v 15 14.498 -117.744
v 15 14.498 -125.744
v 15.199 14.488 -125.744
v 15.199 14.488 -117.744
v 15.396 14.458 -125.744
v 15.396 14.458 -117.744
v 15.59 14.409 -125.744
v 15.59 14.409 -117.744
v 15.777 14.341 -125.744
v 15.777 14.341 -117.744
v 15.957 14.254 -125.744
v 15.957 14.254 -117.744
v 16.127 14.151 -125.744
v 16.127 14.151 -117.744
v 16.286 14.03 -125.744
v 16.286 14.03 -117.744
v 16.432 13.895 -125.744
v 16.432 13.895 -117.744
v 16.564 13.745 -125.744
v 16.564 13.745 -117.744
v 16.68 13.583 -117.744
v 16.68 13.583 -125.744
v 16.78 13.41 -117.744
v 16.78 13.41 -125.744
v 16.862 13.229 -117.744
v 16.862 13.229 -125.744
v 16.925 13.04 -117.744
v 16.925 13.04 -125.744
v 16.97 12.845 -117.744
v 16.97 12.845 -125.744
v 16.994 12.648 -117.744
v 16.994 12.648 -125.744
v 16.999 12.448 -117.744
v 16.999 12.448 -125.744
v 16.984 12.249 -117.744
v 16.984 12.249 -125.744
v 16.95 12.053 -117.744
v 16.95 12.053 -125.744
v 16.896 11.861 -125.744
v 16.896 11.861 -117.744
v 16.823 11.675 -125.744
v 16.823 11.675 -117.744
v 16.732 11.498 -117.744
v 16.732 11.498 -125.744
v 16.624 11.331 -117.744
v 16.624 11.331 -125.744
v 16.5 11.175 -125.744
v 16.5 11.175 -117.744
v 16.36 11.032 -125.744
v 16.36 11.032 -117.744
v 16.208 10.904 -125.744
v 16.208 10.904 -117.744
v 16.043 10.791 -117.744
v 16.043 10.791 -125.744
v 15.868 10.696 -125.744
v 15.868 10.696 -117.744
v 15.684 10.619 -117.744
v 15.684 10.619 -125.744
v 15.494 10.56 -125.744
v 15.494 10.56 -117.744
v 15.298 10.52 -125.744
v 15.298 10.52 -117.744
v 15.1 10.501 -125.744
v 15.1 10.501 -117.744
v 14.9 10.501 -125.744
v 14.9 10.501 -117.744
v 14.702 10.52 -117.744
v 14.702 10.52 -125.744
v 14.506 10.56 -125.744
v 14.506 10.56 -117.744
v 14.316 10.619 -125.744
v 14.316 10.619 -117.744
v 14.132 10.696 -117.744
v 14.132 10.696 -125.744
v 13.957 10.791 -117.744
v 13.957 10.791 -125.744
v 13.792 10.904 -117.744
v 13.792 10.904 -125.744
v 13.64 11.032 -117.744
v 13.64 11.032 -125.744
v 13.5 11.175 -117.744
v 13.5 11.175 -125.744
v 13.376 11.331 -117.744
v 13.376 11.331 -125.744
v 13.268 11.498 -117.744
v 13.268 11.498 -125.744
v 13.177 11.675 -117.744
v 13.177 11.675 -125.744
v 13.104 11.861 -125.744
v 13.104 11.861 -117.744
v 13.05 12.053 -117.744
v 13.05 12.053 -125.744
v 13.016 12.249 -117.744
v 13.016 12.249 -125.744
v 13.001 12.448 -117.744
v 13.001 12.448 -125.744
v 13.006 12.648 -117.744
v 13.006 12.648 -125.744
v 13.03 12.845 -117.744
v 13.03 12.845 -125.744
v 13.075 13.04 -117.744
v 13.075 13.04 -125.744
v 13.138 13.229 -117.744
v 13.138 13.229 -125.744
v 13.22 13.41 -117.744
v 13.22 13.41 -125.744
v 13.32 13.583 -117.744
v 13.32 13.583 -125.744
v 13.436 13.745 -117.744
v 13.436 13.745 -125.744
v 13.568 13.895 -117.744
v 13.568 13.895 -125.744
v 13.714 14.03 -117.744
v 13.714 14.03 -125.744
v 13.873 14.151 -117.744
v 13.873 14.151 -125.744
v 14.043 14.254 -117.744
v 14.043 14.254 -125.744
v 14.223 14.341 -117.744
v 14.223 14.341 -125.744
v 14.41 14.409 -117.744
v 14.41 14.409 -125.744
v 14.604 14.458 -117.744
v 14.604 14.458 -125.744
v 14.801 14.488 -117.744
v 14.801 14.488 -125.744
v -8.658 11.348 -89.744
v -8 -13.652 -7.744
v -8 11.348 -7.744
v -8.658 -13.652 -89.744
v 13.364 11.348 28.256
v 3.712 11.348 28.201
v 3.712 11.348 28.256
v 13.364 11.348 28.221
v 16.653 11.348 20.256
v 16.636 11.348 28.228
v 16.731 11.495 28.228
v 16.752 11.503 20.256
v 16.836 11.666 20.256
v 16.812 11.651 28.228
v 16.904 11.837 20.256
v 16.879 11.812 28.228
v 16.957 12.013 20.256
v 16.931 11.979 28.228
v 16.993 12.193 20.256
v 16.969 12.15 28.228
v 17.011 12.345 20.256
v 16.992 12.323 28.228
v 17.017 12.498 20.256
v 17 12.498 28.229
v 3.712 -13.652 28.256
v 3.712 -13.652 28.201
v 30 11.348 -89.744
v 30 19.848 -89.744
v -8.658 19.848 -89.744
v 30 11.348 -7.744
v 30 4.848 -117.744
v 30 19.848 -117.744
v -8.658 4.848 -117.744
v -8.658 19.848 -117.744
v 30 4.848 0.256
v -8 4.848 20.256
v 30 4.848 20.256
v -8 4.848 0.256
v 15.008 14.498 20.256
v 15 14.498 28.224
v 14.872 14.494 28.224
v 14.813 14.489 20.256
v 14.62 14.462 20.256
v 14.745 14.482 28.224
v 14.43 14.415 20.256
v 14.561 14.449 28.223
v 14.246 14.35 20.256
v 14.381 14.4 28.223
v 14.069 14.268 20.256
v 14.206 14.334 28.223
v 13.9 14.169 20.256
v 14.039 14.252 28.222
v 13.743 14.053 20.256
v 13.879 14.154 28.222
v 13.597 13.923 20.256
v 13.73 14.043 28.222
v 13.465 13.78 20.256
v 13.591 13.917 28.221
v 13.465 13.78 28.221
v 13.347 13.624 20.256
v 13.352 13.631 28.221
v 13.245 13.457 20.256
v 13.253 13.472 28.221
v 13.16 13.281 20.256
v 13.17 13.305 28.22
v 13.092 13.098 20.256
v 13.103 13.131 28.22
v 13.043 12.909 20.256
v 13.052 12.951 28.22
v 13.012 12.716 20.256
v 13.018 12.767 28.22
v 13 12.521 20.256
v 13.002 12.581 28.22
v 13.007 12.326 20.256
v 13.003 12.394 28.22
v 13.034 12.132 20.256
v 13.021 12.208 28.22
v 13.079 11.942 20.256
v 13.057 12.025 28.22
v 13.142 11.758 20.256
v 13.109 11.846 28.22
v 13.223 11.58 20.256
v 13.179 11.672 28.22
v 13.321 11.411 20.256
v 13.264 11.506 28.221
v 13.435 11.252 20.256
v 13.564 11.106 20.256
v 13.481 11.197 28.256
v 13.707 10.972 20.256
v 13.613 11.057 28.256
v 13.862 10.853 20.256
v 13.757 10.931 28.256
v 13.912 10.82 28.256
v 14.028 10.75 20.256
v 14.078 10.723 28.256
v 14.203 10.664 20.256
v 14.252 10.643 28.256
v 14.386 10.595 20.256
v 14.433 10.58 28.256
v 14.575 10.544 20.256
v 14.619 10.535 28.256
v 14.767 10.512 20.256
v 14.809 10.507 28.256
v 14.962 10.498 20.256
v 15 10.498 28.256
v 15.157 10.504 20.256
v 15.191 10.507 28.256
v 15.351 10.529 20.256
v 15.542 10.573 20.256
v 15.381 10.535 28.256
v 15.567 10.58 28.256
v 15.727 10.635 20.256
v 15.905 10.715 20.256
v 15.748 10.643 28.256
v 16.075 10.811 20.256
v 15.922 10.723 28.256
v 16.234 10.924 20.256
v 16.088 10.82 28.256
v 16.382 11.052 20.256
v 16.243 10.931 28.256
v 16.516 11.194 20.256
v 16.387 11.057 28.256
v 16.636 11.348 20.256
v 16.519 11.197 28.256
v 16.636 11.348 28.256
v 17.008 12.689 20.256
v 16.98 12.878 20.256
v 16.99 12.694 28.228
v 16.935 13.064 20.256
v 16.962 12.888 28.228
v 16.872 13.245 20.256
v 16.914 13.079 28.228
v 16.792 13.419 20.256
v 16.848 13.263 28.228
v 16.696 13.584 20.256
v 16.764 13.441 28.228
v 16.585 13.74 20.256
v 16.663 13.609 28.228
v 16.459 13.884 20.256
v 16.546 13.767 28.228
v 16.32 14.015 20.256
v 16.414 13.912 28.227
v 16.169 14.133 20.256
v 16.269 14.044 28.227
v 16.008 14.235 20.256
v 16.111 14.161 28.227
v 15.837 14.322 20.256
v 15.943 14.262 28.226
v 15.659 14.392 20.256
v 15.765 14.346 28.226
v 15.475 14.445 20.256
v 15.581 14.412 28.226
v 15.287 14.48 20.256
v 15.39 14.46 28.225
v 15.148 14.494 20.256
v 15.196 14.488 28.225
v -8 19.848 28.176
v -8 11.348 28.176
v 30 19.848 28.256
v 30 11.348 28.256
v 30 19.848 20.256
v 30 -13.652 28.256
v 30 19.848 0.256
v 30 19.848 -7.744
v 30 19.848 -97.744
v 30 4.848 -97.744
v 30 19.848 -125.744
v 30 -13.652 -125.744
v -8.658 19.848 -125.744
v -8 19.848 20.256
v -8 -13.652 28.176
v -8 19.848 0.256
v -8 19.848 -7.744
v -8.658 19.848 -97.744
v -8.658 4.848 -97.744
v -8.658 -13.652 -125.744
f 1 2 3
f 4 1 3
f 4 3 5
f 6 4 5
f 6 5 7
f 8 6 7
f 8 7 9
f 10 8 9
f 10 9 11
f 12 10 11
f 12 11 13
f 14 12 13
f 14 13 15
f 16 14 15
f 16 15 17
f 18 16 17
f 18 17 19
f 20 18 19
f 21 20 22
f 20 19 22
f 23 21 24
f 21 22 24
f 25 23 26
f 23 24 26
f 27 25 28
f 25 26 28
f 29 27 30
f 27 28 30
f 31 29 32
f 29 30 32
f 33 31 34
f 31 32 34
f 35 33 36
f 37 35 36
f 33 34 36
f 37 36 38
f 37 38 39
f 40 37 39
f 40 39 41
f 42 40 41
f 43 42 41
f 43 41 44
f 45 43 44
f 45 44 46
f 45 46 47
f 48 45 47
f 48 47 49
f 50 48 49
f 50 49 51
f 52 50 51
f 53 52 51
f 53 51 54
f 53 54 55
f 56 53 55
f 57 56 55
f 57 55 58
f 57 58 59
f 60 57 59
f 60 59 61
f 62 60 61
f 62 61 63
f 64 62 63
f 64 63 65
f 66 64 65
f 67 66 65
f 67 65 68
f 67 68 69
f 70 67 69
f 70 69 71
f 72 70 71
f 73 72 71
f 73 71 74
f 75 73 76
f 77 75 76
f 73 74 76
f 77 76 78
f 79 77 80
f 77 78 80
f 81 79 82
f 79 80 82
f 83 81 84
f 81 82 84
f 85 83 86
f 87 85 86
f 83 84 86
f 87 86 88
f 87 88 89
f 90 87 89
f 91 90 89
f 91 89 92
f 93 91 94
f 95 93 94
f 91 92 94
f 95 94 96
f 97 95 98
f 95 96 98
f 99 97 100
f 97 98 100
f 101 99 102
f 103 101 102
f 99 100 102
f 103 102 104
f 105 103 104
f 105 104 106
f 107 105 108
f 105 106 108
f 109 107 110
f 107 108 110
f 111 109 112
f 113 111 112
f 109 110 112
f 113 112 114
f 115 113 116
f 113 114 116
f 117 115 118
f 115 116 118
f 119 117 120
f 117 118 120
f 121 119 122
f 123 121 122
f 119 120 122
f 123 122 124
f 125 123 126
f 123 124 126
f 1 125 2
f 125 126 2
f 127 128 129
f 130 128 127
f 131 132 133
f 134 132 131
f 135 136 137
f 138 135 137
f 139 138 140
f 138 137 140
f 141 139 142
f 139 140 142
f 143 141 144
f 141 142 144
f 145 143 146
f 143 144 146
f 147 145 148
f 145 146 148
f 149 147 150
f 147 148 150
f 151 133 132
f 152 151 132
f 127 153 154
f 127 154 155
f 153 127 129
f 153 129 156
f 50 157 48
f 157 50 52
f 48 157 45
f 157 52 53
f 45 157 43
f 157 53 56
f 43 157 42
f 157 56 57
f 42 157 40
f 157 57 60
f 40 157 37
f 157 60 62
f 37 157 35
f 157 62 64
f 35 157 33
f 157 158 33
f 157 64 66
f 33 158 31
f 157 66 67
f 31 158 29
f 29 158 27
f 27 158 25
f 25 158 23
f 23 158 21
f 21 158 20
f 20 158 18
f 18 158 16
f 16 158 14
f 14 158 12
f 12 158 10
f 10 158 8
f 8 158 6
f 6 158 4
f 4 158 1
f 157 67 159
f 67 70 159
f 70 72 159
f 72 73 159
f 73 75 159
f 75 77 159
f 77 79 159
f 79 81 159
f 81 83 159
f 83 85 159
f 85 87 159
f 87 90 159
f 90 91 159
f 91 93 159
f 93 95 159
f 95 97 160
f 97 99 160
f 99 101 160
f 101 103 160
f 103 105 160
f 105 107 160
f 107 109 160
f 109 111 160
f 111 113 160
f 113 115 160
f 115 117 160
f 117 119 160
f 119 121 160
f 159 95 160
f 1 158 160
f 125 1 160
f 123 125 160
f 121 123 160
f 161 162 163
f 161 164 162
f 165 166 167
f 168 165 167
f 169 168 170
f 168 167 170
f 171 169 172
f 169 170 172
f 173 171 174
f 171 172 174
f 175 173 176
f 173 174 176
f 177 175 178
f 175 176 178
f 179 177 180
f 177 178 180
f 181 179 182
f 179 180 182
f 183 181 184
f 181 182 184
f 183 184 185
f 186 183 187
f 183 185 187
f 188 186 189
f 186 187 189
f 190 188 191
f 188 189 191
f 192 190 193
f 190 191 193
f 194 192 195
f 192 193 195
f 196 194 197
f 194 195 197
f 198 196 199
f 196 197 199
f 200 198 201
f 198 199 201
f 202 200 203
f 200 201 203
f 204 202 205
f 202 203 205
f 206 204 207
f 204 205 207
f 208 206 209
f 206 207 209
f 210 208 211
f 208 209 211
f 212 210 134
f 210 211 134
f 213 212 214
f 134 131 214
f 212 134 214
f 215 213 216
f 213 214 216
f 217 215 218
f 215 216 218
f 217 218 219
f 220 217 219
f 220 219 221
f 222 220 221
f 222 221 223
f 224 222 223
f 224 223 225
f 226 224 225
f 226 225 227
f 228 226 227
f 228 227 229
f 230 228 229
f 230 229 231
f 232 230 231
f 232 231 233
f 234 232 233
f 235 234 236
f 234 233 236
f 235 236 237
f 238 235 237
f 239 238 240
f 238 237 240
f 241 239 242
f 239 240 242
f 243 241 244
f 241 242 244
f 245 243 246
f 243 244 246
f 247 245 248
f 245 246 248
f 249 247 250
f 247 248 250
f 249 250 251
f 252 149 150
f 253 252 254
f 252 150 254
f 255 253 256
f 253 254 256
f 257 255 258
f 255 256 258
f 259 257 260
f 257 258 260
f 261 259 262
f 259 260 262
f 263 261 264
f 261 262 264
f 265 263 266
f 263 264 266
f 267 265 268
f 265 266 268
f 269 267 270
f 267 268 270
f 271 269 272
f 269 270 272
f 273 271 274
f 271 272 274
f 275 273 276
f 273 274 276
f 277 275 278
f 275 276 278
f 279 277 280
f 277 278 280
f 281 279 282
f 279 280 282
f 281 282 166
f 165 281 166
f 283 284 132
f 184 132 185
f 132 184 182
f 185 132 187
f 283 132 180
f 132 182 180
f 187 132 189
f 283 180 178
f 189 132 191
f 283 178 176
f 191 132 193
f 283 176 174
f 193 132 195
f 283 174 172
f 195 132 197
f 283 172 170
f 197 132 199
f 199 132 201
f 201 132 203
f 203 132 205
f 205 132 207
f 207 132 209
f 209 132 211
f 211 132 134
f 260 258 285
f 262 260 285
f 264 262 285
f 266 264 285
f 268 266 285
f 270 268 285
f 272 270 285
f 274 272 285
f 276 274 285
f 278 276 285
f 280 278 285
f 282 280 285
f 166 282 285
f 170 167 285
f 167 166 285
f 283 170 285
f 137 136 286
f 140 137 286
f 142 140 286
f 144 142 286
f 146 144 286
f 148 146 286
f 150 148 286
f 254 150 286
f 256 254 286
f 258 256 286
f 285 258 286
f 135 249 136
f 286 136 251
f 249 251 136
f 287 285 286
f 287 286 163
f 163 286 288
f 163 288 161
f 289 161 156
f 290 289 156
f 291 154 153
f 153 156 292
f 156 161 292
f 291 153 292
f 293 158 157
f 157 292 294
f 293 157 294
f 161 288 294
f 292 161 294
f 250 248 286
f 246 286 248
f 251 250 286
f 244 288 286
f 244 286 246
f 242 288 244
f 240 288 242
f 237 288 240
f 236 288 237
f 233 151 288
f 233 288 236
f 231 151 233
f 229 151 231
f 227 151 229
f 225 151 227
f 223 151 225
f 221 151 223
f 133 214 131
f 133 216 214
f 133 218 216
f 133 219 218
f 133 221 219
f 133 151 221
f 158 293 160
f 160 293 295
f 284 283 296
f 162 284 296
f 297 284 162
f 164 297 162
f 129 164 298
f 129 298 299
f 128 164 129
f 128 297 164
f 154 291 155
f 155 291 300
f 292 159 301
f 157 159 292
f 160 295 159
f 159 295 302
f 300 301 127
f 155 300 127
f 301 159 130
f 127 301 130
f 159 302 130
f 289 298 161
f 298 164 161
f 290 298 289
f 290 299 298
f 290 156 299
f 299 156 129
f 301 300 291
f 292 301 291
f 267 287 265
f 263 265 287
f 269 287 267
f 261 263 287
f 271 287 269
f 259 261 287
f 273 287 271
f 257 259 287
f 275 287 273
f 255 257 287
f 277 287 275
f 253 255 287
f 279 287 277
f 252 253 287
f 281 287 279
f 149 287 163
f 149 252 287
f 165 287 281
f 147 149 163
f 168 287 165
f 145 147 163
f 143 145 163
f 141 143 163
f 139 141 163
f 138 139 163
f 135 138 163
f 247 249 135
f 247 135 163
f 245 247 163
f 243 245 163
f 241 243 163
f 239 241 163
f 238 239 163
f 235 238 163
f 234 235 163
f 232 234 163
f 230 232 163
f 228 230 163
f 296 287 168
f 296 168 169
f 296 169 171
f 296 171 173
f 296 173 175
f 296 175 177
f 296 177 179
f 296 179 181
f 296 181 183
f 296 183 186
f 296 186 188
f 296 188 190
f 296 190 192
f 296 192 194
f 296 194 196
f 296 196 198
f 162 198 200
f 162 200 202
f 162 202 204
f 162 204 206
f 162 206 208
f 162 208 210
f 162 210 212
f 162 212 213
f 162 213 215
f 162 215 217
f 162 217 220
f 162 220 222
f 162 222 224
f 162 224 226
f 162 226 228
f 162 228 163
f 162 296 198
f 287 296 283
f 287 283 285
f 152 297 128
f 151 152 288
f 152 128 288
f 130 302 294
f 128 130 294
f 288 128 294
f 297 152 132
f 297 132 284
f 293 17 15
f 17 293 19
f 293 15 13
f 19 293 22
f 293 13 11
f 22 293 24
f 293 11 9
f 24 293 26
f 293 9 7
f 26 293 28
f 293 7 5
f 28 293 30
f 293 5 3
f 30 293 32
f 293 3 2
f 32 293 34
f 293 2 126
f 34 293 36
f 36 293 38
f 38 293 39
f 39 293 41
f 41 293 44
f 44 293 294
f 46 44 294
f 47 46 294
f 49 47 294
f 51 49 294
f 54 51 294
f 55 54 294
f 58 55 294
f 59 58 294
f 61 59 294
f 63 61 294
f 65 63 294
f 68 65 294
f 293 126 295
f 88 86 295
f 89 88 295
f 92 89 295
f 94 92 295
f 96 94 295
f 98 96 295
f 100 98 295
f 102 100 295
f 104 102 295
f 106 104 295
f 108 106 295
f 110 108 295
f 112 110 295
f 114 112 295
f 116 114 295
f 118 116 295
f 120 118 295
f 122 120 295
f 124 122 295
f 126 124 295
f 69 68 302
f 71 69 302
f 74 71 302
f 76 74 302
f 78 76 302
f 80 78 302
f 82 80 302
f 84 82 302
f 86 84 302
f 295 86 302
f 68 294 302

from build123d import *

# Parameters (mm, degrees)
EXTRUDE_1_DEPTH           = 30
SKETCH_2_W                = 20
SKETCH_2_H                = 15
SKETCH_2_W_2              = 70
SKETCH_2_H_2              = 10
EXTRUDE_4_DEPTH           = 70
SKETCH_5_R                = 2.8
CUT_EXTRUDE_3_DEPTH       = 5
SKETCH_6_R                = 2.8
CUT_EXTRUDE_4_DEPTH       = 5
PATTERN_LINEAR_1_COUNT    = 3
PATTERN_LINEAR_1_PITCH    = 19
SKETCH_14_W               = 30
SKETCH_14_H               = 20
EXTRUDE_16_DEPTH          = 8.5
EXTRUDE_17_DEPTH          = 8.5
EXTRUDE_18_DEPTH          = 8.5
SKETCH_15_W               = 140
SKETCH_15_H               = 160
EXTRUDE_21_DEPTH          = 10
SKETCH_17_W               = 140
SKETCH_17_H               = 160
EXTRUDE_22_DEPTH          = 15
CUT_EXTRUDE_8_REACH       = 328.336
SKETCH_20_R               = 2
CUT_EXTRUDE_10_REACH      = 267.273
CUT_EXTRUDE_11_REACH      = 267.358
SKETCH_22_R               = 2
SKETCH_23_R               = 2.8
CUT_EXTRUDE_12_DEPTH      = 5
SKETCH_24_R               = 1.9
CUT_EXTRUDE_13_DEPTH      = 5
CUT_EXTRUDE_16_DEPTH      = 251.685617404
CUT_EXTRUDE_16_DEPTH_BACK = 251.685617404
CUT_EXTRUDE_17_DEPTH      = 15


with BuildPart() as part:
    # 草图1 → 凸台-拉伸1 (new body)
    with BuildSketch(Plane(origin=(0, 0, 0), x_dir=(0, 0, -1), z_dir=(1, 0, 0))):
        Polygon((-20.255776875, 11.348042253), (-20.255776875, -3.651957747), (-0.255776875, -3.651957747), (-0.255776875, 11.348042253), (97.744223125, 11.348042253), (97.744223125, -3.651957747), (117.744223125, -3.651957747), (117.744223125, 11.348042253), (125.744223125, 11.348042253), (125.744223125, -13.651957747), (-28.255776875, -13.651957747), (-28.255776875, 11.348042253), align=None)
    extrude(amount=EXTRUDE_1_DEPTH)

    # 草图2 → 凸台-拉伸4 (add)
    with BuildSketch(Plane.ZY):
        Polygon((-125.744223125, 11.348042253), (-117.744223125, 11.348042253), (-117.744223125, 16.348042253), (-132.744223125, 16.348042253), (-132.744223125, -13.651957747), (-125.744223125, -13.651957747), align=None)
        Polygon((-117.744223125, -13.651957747), (-117.744223125, -3.651957747), (-117.744223125, 11.348042253), (-125.744223125, 11.348042253), (-125.744223125, -13.651957747), align=None)
        Polygon((-97.744223125, -3.651957747), (-117.744223125, -3.651957747), (-117.744223125, -13.651957747), (28.255776875, -13.651957747), (28.255776875, 11.348042253), (20.255776875, 11.348042253), (20.255776875, -3.651957747), (0.255776875, -3.651957747), (0.255776875, 11.348042253), (-97.744223125, 11.348042253), align=None)
        with Locations((-107.744223125, 3.848042253)):
            Rectangle(SKETCH_2_W, SKETCH_2_H)
        with Locations((10.255776875, 3.848042253)):
            Rectangle(SKETCH_2_W, SKETCH_2_H)
        Polygon((28.255776875, 11.348042253), (28.255776875, -13.651957747), (53.255776875, -13.651957747), (53.255776875, -3.651957747), (53.255776875, 11.348042253), align=None)
        with Locations((88.255776875, -8.651957747)):
            Rectangle(SKETCH_2_W_2, SKETCH_2_H_2)
    extrude(amount=EXTRUDE_4_DEPTH)

    # 草图5 → 切除-拉伸3 (cut)
    with BuildSketch(Plane(origin=(0, 16.348042253, 0), x_dir=(1, 0, 0), z_dir=(0, 1, 0))):
        with Locations(Location((-51, 125.244223125, 0), (0, 0, 270))):
            Circle(SKETCH_5_R)
        with Locations(Location((-19, 125.244223125, 0), (0, 0, 270))):
            Circle(SKETCH_5_R)
    extrude(amount=-CUT_EXTRUDE_3_DEPTH, mode=Mode.SUBTRACT)

    # 草图6 → 切除-拉伸4 (cut)
    with BuildSketch(Plane(origin=(0, -3.651957747, 0), x_dir=(1, 0, 0), z_dir=(0, 1, 0))):
        with Locations(Location((-55, -112.316244648, 0), (0, 0, 270))):
            Circle(SKETCH_6_R)
        with Locations(Location((-15, -112.316244648, 0), (0, 0, 270))):
            Circle(SKETCH_6_R)
    cut_extrude_4 = extrude(amount=-CUT_EXTRUDE_4_DEPTH, mode=Mode.SUBTRACT)

    # 阵列(线性)1: 切除-拉伸4 ×3
    with Locations(*[(0, 0, -i * PATTERN_LINEAR_1_PITCH) for i in range(1, PATTERN_LINEAR_1_COUNT)]):
        add(cut_extrude_4, mode=Mode.SUBTRACT)

    # 草图14 → 凸台-拉伸16 (add)
    with BuildSketch(Plane(origin=(0, -3.651957747, 0), x_dir=(1, 0, 0), z_dir=(0, 1, 0))):
        with Locations((15, -10.255776875)):
            Rectangle(SKETCH_14_W, SKETCH_14_H)
        with Locations((15, 107.744223125)):
            Rectangle(SKETCH_14_W, SKETCH_14_H)
    extrude(amount=EXTRUDE_16_DEPTH)

    # 草图9 → 凸台-拉伸17 (add)
    with BuildSketch(Plane(origin=(0, 11.348042253, 0), x_dir=(1, 0, 0), z_dir=(0, 1, 0))):
        Polygon((-8.658071854, 117.744223125), (-8.658071854, 125.744223125), (0, 125.744223125), (30, 125.744223125), (30, 117.744223125), (0, 117.744223125), (0, 97.744223125), (30, 97.744223125), (30, 89.744223125), (-8.658071854, 89.744223125), align=None)
    extrude(amount=EXTRUDE_17_DEPTH)

    # 草图13 → 凸台-拉伸18 (add)
    with BuildSketch(Plane(origin=(0, 11.348042253, 0), x_dir=(1, 0, 0), z_dir=(0, 1, 0))):
        Polygon((30, -0.255776875), (30, 7.744223125), (-8, 7.744223125), (-8, -28.176051311), (30, -28.255776875), (30, -20.255776875), (0, -20.255776875), (0, -0.255776875), align=None)
    extrude(amount=EXTRUDE_18_DEPTH)

    # 草图15 → 凸台-拉伸21 (add)
    with BuildSketch(Plane(origin=(0, -3.651957747, 0), x_dir=(1, 0, 0), z_dir=(0, 1, 0))):
        with Locations((-140, -43.255776875)):
            Rectangle(SKETCH_15_W, SKETCH_15_H)
    extrude(amount=-EXTRUDE_21_DEPTH)

    # 草图17 → 凸台-拉伸22 (add)
    with BuildSketch(Plane(origin=(0, -3.651957747, 0), x_dir=(1, 0, 0), z_dir=(0, 1, 0))):
        with Locations((-140, -43.255776875)):
            Rectangle(SKETCH_17_W, SKETCH_17_H)
    extrude(amount=EXTRUDE_22_DEPTH)

    # 草图20 → 切除-拉伸8 (cut, up to next)
    with BuildSketch(Plane(origin=(0, 0, -125.744223125), x_dir=(-1, 0, 0), z_dir=(0, 0, -1)), mode=Mode.PRIVATE) as cut_extrude_8_sk1:
        with Locations(Location((-15, 12.498042253, 0), (0, 0, 90))):
            Circle(SKETCH_20_R)
    cut_extrude_8_tool1 = extrude(cut_extrude_8_sk1.sketch, amount=-CUT_EXTRUDE_8_REACH, mode=Mode.PRIVATE) & part.part
    add(cut_extrude_8_tool1.solids().sort_by_distance((15, 12.498042, -125.744223))[0], mode=Mode.SUBTRACT)

    # 切除-拉伸10: up to this plane
    cut_extrude_10_end = Plane(origin=(30, 11.348042253, 20.255776875), z_dir=(0, 0, 1))
    # 草图21 → 切除-拉伸10 (cut, up to the surface)
    with BuildSketch(Plane(origin=(-0.059149469, 0, 28.192711542), x_dir=(0.9999977991189155, 0, 0.0020980365404790436), z_dir=(-0.0020980365404790436, 0, 0.9999977991189156)), mode=Mode.PRIVATE) as cut_extrude_10_sk1:
        with BuildLine():
            ThreePointArc((17.059215626, 12.498042253), (14.456145827, 14.404952533), (13.422908809, 11.348042253))
            Line((13.422908809, 11.348042253), (16.695522443, 11.348042253))
            ThreePointArc((16.695522443, 11.348042253), (16.966125906, 11.894972454), (17.059215626, 12.498042253))
        make_face()
    cut_extrude_10_tool1 = split(extrude(cut_extrude_10_sk1.sketch, amount=-CUT_EXTRUDE_10_REACH, mode=Mode.PRIVATE), bisect_by=cut_extrude_10_end, keep=Keep.BOTH, mode=Mode.PRIVATE)
    add(cut_extrude_10_tool1.solids().sort_by_distance((15.000033, 12.773192, 28.224306))[0], mode=Mode.SUBTRACT)

    # 草图22 → 切除-拉伸11 (cut, up to next)
    with BuildSketch(Plane.XY.offset(28.255776875), mode=Mode.PRIVATE) as cut_extrude_11_sk1:
        with Locations(Location((15, 12.498042253, 0), (0, 0, 90))):
            Circle(SKETCH_22_R)
    cut_extrude_11_tool1 = extrude(cut_extrude_11_sk1.sketch, amount=-CUT_EXTRUDE_11_REACH, mode=Mode.PRIVATE) & part.part
    add(cut_extrude_11_tool1.solids().sort_by_distance((15, 12.498042, 28.255777))[0], mode=Mode.SUBTRACT)

    # 草图23 → 切除-拉伸12 (cut)
    with BuildSketch(Plane(origin=(0, 11.348042253, 0), x_dir=(1, 0, 0), z_dir=(0, 1, 0))):
        with Locations(Location((-194, -93.255776875, 0), (0, 0, 270))):
            Circle(SKETCH_23_R)
        with Locations(Location((-86, -93.255776875, 0), (0, 0, 270))):
            Circle(SKETCH_23_R)
    extrude(amount=-CUT_EXTRUDE_12_DEPTH, mode=Mode.SUBTRACT)

    # 草图24 → 切除-拉伸13 (cut)
    with BuildSketch(Plane(origin=(0, 11.348042253, 0), x_dir=(1, 0, 0), z_dir=(0, 1, 0))):
        with Locations(Location((-196.5, 26.744223125, 0), (0, 0, 270))):
            Circle(SKETCH_24_R)
        with Locations(Location((-83.5, 26.744223125, 0), (0, 0, 270))):
            Circle(SKETCH_24_R)
        with Locations(Location((-196.5, -47.555776875, 0), (0, 0, 270))):
            Circle(SKETCH_24_R)
        with Locations(Location((-83.5, -47.555776875, 0), (0, 0, 270))):
            Circle(SKETCH_24_R)
    extrude(amount=-CUT_EXTRUDE_13_DEPTH, mode=Mode.SUBTRACT)

    # 草图26 → 切除-拉伸16 (cut, two sides: drawn at the far end of the back side and taken through both)
    with BuildSketch(Plane(origin=(0, 19.848042253, 0), x_dir=(1, 0, 0), z_dir=(0, 1, 0)).offset(-CUT_EXTRUDE_16_DEPTH_BACK)):
        Polygon((-8, 7.744223125), (-8.658071854, 89.744223125), (-8.658071854, 125.744223125), (3.217660612, 125.744223125), (3.802444891, 150.192522069), (-171.612640653, 166.525859149), (-482.190724596, -91.141473661), (-210.719247924, -353.972429265), (3.510052751, -124.506752876), (3.712106974, -28.200623793), (-8, -28.176051311), align=None)
    extrude(amount=CUT_EXTRUDE_16_DEPTH + CUT_EXTRUDE_16_DEPTH_BACK, mode=Mode.SUBTRACT)

    # 草图27 → 切除-拉伸17 (cut)
    with BuildSketch(Plane(origin=(0, 19.848042253, 0), x_dir=(1, 0, 0), z_dir=(0, 1, 0))):
        Polygon((-11.220288102, -0.255776875), (-9.170863609, -20.255776875), (0, -20.255776875), (0, -0.255776875), align=None)
        Polygon((-8.658071854, 97.744223125), (0, 97.744223125), (0, 117.744223125), (-8.658071854, 104.132040921), align=None)
        Polygon((-16.859481318, 117.744223125), (-12.721063711, 97.744223125), (-8.658071854, 104.132040921), (-8.658071854, 117.744223125), align=None)
        Polygon((-8.658071854, 104.132040921), (0, 117.744223125), (-8.658071854, 117.744223125), align=None)
    extrude(amount=-CUT_EXTRUDE_17_DEPTH, mode=Mode.SUBTRACT)


solid = part.part
